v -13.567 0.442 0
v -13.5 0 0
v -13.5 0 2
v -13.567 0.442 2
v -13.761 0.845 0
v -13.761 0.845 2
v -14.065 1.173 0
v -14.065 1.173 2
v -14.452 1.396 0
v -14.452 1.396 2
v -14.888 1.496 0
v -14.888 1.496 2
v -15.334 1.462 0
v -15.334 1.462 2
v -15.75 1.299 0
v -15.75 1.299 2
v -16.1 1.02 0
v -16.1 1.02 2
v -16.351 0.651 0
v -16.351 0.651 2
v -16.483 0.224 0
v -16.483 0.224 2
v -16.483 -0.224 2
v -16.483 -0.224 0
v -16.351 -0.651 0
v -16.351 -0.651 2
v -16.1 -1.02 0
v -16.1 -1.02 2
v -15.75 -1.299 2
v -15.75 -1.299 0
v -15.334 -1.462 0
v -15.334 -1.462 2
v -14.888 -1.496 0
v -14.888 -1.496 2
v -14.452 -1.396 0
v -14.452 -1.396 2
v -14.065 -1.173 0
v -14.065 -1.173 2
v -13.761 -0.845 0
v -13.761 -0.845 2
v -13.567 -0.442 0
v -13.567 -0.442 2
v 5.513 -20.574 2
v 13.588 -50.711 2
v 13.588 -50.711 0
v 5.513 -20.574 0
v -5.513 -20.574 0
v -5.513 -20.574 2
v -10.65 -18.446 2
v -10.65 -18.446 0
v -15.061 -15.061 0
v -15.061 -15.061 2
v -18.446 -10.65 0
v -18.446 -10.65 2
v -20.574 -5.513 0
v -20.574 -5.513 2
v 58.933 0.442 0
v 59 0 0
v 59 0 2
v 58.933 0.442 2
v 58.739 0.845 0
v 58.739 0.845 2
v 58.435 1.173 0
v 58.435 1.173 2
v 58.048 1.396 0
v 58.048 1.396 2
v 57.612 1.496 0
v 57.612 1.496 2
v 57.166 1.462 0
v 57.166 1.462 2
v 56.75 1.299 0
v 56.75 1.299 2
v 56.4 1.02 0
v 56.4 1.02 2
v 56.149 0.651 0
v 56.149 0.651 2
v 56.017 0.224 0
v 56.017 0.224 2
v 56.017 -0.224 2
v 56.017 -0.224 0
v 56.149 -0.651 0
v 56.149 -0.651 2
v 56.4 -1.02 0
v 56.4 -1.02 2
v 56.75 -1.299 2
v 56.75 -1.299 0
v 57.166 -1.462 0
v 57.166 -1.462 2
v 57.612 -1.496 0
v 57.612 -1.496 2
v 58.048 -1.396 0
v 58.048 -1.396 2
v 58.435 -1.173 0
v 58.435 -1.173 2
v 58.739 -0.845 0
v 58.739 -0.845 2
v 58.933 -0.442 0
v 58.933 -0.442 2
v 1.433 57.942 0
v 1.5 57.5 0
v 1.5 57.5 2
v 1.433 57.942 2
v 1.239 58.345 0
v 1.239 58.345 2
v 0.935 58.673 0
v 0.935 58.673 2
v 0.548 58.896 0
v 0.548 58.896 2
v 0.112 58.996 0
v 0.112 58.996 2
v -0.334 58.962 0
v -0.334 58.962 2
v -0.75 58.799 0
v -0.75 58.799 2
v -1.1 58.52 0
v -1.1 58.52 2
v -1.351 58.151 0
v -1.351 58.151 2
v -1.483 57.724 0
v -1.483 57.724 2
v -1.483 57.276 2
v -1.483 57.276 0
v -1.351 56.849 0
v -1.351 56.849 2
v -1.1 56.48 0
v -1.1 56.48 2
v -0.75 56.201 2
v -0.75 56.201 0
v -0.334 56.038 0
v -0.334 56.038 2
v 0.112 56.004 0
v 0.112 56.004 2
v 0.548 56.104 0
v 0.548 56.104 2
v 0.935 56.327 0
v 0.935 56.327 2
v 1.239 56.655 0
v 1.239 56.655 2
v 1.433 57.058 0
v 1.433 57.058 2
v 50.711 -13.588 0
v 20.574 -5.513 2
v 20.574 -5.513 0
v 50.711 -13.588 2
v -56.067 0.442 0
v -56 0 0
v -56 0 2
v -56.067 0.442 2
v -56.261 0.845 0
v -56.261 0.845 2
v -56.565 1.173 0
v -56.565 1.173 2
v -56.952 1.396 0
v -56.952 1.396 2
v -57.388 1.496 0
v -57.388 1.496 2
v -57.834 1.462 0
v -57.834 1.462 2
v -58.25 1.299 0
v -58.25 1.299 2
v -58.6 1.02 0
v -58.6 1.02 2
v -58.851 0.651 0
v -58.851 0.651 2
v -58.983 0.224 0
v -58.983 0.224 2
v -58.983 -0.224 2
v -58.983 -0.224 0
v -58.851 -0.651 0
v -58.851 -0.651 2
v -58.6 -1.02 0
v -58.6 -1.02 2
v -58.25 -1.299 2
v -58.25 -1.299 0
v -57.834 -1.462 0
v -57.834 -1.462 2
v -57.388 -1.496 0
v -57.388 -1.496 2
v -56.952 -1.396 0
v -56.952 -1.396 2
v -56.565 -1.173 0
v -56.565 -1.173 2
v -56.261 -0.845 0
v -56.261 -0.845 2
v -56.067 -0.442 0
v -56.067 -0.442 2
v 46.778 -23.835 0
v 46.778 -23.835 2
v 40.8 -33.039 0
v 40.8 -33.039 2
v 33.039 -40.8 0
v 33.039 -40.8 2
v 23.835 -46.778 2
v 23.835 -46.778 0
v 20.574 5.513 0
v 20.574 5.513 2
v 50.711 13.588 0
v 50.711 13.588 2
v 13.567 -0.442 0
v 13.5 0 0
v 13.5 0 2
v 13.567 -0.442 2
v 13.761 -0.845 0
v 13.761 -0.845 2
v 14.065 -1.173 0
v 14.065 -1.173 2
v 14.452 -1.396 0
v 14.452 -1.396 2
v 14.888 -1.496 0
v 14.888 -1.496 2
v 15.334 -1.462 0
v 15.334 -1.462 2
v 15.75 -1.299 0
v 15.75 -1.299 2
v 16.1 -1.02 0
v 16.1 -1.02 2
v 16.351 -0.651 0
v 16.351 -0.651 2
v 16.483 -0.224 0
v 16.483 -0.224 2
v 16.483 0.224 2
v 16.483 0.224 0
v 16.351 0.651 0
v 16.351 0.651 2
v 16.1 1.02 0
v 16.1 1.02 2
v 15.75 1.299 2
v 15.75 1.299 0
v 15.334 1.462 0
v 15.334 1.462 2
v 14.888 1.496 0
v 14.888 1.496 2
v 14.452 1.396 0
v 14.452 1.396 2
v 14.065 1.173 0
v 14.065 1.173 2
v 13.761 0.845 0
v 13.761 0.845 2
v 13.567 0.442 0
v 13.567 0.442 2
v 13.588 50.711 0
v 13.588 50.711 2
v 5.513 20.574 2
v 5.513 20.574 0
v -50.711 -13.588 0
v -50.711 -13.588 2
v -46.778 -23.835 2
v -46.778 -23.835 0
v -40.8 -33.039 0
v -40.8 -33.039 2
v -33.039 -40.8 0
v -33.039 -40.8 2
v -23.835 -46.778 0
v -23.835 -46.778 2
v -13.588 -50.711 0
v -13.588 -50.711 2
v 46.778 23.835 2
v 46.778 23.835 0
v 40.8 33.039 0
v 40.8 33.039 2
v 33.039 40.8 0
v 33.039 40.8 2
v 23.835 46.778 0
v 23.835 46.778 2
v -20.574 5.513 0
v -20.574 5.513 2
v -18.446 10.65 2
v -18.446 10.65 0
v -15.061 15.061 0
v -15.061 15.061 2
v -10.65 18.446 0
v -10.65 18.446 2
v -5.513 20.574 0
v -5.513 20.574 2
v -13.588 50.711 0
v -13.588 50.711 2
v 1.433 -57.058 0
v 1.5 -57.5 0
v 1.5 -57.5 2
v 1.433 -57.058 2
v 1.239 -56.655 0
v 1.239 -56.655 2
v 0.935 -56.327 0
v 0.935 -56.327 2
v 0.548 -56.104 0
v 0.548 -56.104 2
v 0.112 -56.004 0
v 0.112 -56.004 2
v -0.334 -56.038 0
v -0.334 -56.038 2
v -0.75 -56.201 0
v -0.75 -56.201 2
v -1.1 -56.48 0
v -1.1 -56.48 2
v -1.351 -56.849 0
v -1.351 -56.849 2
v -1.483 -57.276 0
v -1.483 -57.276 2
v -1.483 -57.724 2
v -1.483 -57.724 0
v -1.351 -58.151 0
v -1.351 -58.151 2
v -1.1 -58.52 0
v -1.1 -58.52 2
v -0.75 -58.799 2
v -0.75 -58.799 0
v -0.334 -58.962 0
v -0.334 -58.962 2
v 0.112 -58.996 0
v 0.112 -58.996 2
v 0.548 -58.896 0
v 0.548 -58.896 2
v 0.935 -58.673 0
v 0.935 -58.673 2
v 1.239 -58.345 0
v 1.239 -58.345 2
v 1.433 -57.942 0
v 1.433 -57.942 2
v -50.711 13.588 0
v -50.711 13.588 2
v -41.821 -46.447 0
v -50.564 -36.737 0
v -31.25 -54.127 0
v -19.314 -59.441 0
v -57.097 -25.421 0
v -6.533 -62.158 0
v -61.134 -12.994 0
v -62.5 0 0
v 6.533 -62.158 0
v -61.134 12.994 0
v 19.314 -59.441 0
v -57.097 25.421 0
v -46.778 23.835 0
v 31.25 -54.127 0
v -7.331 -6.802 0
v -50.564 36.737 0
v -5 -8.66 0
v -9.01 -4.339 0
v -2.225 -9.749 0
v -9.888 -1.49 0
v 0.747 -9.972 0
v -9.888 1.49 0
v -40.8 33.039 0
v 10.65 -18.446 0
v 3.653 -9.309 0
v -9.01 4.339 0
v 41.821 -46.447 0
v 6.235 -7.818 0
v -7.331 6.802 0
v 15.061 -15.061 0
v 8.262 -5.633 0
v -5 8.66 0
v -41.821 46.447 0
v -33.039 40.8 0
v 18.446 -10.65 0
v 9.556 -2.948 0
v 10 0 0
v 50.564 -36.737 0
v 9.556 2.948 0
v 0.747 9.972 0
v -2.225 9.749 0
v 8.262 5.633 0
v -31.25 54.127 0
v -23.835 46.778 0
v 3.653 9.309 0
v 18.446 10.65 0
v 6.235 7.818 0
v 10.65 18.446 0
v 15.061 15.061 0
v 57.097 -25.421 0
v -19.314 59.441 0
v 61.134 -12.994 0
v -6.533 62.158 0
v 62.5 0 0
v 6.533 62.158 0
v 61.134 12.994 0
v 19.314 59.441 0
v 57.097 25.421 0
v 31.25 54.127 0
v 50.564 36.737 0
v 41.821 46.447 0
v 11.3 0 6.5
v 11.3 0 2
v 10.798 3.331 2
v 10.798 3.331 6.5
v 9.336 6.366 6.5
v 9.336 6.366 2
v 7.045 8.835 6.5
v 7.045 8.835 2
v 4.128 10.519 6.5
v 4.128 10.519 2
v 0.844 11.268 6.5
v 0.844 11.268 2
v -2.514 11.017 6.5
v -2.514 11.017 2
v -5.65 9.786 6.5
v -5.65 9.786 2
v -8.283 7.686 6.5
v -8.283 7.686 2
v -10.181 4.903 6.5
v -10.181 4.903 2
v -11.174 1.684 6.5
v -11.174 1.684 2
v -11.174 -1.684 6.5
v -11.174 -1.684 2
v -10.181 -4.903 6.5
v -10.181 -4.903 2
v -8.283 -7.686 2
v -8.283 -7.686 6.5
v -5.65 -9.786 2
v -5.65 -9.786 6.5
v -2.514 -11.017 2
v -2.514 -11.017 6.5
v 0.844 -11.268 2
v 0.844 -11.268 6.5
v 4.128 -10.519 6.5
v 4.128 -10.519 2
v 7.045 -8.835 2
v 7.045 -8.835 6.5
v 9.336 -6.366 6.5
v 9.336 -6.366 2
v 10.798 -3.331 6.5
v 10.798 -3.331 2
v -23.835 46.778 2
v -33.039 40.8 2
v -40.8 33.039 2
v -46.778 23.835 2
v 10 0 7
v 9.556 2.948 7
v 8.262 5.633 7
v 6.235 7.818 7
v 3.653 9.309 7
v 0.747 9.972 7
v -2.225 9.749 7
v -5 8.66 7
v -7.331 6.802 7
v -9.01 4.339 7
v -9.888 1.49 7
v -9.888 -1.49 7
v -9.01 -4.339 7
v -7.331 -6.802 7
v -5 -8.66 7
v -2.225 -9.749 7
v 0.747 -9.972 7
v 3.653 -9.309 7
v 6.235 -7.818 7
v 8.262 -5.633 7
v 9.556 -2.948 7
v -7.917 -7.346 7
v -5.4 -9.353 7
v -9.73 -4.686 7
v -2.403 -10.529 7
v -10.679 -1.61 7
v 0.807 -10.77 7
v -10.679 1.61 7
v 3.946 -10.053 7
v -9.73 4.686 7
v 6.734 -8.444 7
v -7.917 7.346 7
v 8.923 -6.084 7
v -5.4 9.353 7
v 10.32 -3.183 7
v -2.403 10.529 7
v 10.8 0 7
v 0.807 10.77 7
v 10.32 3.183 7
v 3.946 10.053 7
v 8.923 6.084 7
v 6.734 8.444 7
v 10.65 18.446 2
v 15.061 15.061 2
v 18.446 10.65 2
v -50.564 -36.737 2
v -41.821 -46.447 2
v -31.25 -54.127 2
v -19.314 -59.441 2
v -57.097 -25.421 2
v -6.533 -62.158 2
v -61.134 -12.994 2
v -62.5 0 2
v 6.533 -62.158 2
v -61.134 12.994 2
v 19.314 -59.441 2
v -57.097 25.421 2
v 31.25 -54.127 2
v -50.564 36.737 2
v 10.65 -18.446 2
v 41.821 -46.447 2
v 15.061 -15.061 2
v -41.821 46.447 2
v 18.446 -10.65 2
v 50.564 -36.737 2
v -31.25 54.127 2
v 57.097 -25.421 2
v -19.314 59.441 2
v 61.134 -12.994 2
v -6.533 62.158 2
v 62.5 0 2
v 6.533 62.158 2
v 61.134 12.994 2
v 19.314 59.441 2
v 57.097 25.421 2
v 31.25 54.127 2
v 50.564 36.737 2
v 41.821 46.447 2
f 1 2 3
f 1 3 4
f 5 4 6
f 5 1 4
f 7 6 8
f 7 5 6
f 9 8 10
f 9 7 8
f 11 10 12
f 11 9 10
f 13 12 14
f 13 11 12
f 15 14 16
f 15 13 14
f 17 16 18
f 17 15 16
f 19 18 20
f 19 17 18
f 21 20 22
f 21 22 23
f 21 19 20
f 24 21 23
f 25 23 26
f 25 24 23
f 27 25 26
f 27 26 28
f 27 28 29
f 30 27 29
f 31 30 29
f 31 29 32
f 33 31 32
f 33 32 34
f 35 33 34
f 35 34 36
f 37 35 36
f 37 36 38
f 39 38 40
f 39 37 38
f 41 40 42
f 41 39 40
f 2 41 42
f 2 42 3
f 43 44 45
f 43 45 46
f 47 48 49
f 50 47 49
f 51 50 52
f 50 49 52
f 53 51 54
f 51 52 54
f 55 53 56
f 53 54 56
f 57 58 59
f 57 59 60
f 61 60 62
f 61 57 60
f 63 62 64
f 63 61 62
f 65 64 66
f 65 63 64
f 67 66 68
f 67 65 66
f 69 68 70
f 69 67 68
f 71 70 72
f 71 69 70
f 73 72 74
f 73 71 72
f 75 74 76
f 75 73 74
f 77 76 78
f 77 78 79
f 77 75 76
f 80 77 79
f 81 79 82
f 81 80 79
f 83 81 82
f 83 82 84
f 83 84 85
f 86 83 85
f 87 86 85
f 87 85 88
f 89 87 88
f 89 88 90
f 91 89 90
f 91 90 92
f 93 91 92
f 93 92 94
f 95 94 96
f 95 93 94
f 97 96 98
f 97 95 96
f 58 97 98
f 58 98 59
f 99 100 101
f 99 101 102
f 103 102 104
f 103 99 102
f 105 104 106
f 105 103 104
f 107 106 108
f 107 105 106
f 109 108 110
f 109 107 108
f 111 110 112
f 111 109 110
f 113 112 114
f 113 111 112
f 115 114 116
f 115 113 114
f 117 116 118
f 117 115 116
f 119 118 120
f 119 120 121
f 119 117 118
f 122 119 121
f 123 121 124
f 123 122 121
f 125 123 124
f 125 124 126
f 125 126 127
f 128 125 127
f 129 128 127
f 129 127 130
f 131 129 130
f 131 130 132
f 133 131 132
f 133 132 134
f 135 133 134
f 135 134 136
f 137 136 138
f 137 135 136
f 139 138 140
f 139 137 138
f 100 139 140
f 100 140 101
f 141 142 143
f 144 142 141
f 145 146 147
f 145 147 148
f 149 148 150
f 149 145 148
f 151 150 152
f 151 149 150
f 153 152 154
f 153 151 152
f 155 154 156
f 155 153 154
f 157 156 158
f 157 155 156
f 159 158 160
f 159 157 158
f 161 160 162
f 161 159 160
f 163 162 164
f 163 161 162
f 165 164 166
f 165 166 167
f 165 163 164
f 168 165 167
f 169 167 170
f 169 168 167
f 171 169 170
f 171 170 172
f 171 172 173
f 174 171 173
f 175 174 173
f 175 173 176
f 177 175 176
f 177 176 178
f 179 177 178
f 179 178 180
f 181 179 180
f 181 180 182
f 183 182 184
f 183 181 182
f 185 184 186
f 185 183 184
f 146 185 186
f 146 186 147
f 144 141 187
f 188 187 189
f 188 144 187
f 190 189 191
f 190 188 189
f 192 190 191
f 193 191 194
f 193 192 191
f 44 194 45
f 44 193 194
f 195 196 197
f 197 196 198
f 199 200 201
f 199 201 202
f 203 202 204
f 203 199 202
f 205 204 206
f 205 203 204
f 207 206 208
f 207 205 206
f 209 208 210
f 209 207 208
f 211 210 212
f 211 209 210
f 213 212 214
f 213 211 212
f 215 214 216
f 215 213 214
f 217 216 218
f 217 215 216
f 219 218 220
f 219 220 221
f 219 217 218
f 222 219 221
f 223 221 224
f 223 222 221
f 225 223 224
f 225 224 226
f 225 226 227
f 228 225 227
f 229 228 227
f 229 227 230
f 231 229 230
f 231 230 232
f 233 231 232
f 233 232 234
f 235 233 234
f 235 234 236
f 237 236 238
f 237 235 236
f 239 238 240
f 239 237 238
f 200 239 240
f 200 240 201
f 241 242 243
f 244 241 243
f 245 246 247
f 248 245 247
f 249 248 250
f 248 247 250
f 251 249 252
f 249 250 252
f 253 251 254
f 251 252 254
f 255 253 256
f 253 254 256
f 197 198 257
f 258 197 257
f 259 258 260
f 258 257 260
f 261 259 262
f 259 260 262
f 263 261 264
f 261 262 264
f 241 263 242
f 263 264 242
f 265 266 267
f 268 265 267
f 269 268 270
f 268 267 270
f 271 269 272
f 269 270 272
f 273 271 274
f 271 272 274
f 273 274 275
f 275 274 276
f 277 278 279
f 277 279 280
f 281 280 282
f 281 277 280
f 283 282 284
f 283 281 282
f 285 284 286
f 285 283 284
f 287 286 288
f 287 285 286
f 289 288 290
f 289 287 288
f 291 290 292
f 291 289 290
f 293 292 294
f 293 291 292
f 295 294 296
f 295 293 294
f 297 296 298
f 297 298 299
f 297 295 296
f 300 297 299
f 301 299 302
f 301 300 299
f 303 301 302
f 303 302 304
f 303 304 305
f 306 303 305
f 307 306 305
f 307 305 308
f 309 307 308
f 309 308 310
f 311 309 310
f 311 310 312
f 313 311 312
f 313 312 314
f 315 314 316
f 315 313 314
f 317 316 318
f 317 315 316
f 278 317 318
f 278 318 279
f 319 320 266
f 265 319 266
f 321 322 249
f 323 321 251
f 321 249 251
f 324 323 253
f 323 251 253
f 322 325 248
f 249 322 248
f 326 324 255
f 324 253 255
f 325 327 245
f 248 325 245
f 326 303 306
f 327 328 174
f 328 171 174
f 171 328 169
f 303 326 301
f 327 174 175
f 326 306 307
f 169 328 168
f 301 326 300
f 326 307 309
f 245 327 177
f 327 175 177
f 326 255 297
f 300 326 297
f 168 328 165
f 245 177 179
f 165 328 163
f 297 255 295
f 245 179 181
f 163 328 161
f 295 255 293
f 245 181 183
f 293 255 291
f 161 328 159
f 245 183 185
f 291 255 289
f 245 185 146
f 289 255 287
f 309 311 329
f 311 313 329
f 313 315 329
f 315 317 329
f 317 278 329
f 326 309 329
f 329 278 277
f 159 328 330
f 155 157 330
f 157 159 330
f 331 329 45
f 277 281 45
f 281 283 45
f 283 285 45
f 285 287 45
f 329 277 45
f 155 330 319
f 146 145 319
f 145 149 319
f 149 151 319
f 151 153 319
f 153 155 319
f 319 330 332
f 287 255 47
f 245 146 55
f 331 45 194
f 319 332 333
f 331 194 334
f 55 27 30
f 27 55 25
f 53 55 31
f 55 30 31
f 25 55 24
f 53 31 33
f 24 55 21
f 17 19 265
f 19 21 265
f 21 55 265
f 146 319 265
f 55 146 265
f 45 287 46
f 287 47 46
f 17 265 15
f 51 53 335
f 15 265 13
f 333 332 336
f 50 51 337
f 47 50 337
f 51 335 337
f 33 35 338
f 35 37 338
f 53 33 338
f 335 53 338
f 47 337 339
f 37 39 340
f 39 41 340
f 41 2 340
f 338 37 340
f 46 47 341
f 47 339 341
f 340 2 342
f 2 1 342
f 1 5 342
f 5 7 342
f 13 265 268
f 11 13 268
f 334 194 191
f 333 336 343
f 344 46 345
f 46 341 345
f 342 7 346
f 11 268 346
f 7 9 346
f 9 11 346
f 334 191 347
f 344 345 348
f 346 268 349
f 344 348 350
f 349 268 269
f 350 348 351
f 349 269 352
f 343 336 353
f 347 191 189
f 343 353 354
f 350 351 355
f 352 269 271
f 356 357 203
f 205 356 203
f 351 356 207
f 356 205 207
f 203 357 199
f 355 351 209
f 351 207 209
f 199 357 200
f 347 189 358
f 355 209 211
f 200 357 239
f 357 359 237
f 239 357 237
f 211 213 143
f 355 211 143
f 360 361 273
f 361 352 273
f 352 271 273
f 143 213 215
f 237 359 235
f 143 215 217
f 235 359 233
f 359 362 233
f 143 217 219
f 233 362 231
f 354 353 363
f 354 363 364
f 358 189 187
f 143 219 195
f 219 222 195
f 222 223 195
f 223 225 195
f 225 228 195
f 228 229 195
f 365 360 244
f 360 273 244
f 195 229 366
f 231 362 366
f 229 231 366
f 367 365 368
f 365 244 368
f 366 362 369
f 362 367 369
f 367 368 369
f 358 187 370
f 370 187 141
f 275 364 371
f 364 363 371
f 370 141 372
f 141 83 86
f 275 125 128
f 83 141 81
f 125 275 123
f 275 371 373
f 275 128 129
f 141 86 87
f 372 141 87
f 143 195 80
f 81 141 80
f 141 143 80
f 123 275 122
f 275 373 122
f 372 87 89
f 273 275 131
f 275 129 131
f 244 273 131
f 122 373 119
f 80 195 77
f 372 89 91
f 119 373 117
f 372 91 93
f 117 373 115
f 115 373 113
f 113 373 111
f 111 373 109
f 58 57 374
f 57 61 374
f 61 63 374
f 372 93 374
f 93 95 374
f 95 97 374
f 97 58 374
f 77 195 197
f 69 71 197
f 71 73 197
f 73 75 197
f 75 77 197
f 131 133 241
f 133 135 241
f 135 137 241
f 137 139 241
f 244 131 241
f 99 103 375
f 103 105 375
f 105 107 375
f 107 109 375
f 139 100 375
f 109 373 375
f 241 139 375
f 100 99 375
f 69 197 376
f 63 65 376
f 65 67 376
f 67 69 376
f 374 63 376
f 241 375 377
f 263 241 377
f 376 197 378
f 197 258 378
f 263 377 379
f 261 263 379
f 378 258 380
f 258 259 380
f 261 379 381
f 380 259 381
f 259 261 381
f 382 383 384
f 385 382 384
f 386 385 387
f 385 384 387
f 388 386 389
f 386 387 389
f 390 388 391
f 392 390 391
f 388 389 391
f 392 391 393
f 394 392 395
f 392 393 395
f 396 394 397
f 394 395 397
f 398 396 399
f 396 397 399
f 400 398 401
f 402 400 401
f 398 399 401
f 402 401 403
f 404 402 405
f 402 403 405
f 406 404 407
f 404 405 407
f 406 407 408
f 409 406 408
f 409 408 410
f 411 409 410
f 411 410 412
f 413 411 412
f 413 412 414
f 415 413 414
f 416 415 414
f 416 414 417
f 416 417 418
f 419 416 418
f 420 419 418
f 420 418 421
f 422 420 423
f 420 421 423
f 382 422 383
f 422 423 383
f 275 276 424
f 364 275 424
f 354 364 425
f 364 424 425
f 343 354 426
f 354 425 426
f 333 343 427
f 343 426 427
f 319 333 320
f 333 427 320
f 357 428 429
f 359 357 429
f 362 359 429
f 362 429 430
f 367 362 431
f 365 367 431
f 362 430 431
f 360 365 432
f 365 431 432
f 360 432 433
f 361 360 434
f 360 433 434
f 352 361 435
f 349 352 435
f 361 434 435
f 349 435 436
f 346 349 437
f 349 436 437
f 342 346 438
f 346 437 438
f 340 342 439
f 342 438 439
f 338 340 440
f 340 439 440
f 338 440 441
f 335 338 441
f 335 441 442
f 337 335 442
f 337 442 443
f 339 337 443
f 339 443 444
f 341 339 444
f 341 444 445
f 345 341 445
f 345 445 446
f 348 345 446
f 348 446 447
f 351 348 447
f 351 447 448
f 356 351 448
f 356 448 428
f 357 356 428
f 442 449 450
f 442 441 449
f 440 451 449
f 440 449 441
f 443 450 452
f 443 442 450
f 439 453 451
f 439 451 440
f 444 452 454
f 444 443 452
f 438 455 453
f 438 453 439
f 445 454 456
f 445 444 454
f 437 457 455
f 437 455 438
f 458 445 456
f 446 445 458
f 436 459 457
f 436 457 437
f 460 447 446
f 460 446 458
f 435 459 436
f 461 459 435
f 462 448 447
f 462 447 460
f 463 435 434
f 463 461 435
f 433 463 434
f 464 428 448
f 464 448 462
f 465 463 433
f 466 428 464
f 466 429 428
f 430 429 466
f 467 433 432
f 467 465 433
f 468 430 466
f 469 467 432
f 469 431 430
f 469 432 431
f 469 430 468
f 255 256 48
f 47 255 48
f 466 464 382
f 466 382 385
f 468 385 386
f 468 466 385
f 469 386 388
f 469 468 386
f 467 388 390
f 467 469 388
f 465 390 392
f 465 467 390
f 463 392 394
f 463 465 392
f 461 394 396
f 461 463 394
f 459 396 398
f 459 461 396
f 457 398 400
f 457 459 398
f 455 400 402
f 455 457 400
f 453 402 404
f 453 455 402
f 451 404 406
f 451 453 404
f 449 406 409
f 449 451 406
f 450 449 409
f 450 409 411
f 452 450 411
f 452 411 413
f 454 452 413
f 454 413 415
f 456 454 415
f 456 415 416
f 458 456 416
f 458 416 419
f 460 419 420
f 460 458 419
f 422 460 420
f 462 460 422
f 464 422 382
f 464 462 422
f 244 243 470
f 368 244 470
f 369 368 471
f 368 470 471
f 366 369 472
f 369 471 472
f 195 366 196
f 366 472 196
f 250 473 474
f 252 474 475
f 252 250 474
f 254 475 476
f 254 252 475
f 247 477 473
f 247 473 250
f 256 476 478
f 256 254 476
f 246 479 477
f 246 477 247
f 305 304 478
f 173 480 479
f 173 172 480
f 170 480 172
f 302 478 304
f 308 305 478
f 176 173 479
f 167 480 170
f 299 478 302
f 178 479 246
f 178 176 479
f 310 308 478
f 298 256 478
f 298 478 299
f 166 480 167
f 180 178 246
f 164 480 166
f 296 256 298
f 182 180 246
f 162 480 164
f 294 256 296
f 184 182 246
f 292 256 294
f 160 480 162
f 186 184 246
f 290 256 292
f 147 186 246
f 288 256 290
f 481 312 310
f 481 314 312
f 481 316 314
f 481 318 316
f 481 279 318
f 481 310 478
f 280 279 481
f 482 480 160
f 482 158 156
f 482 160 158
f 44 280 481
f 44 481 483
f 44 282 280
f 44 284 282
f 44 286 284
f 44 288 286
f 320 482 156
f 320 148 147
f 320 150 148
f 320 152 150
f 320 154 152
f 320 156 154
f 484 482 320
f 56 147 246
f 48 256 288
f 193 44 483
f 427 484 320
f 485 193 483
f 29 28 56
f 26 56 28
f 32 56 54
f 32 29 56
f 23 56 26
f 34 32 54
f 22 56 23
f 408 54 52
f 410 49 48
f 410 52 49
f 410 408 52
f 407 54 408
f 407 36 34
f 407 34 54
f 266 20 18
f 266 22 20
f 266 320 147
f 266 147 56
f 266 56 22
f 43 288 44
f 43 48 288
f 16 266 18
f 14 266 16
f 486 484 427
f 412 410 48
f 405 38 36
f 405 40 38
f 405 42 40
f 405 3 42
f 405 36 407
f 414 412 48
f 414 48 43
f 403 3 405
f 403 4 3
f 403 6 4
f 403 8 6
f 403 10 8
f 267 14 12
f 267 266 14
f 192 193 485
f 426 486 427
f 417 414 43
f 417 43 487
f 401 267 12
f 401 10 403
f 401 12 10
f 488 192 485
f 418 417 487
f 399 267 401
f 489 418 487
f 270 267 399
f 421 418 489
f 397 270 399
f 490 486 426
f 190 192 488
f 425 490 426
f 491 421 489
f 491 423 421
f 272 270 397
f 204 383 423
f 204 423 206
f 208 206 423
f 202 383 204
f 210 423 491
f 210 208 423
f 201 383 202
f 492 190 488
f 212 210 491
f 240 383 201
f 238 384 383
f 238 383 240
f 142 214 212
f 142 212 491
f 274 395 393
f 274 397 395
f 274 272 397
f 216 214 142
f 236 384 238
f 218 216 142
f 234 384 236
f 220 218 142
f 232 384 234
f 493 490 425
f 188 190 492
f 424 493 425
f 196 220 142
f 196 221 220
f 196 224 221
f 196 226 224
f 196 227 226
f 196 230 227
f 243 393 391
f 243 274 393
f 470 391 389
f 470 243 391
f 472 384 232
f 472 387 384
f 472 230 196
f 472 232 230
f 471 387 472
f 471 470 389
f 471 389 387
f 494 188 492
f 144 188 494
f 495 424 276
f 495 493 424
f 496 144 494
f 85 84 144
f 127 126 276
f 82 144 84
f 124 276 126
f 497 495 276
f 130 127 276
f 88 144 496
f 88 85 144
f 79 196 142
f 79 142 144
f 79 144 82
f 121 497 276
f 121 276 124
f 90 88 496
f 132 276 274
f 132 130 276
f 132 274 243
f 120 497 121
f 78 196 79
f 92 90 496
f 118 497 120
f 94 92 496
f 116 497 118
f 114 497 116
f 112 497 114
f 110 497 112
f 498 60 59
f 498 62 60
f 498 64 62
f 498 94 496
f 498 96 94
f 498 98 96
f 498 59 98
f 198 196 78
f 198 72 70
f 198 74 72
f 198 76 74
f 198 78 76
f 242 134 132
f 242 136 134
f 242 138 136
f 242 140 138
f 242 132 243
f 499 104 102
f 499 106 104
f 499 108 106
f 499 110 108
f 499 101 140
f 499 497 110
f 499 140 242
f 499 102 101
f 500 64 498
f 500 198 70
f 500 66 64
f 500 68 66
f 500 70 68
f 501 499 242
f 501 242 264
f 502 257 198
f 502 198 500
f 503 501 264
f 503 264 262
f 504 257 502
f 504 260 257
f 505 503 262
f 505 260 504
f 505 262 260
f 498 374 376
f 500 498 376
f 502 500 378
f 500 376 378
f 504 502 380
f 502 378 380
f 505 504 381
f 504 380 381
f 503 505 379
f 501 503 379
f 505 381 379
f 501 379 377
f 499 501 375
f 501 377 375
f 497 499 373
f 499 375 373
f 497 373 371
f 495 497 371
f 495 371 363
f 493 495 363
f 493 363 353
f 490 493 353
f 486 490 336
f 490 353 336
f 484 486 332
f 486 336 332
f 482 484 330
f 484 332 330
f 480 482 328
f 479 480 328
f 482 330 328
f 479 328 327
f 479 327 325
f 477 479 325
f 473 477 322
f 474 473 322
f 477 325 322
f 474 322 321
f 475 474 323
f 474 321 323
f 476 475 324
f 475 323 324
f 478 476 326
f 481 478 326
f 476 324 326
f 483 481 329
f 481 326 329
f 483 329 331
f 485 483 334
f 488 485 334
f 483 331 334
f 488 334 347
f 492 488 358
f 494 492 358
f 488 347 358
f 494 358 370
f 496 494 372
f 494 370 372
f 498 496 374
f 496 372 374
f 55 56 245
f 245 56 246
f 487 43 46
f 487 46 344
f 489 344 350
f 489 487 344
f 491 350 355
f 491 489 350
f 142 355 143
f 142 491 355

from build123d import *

# Parameters (mm, degrees)
SKETCH1_R           = 62.5
SKETCH1_R_2         = 1.5
BOSS_EXTRUDE1_DEPTH = 2
SKETCH2_R           = 11.3
BOSS_EXTRUDE2_DEPTH = 5
SECTORS_DEPTH       = 89.529656048
SKETCH_1_R          = 10
CUT_EXTRUDE_1_DEPTH = 89.665100237
CHAMFER_1_SIZE      = 0.5


with BuildPart() as part:
    # Sketch1 → Boss-Extrude1 (new body)
    with BuildSketch(Plane.XY):
        Circle(SKETCH1_R)
        with Locations((-57.5, 0)):
            Circle(SKETCH1_R_2, mode=Mode.SUBTRACT)
        with Locations((0, 57.5)):
            Circle(SKETCH1_R_2, mode=Mode.SUBTRACT)
        with Locations((57.5, 0)):
            Circle(SKETCH1_R_2, mode=Mode.SUBTRACT)
        with Locations((0, -57.5)):
            Circle(SKETCH1_R_2, mode=Mode.SUBTRACT)
        with Locations((-15, 0)):
            Circle(SKETCH1_R_2, mode=Mode.SUBTRACT)
        with Locations(Location((15, 0, 0), (0, 0, 180))):
            Circle(SKETCH1_R_2, mode=Mode.SUBTRACT)
    extrude(amount=BOSS_EXTRUDE1_DEPTH)

    # Sketch2 → Boss-Extrude2 (add)
    with BuildSketch(Plane.XY.offset(2)):
        Circle(SKETCH2_R)
    extrude(amount=BOSS_EXTRUDE2_DEPTH)

    # Sector (Cut Extrude) → Sectors (cut, through all)
    with BuildSketch(Plane.XY.offset(2)):
        with BuildLine():
            Line((20.5742201, -5.512845661), (50.71110588, -13.587999868))
            ThreePointArc((50.71110588, -13.587999868), (37.123106012, -37.123106012), (13.587999868, -50.71110588))
            Line((13.587999868, -50.71110588), (5.512845661, -20.5742201))
            ThreePointArc((5.512845661, -20.5742201), (15.061374439, -15.061374439), (20.5742201, -5.512845661))
        make_face()
        with BuildLine():
            Line((-20.5742201, -5.512845661), (-50.71110588, -13.587999868))
            ThreePointArc((-50.71110588, -13.587999868), (-37.123106012, -37.123106012), (-13.587999868, -50.71110588))
            Line((-13.587999868, -50.71110588), (-5.512845661, -20.5742201))
            ThreePointArc((-5.512845661, -20.5742201), (-15.061374439, -15.061374439), (-20.5742201, -5.512845661))
        make_face()
        with BuildLine():
            Line((-5.512845661, 20.5742201), (-13.587999868, 50.71110588))
            ThreePointArc((-13.587999868, 50.71110588), (-37.123106012, 37.123106012), (-50.71110588, 13.587999868))
            Line((-50.71110588, 13.587999868), (-20.5742201, 5.512845661))
            ThreePointArc((-20.5742201, 5.512845661), (-15.061374439, 15.061374439), (-5.512845661, 20.5742201))
        make_face()
        with BuildLine():
            Line((20.5742201, 5.512845661), (50.71110588, 13.587999868))
            ThreePointArc((50.71110588, 13.587999868), (37.123106012, 37.123106012), (13.587999868, 50.71110588))
            Line((13.587999868, 50.71110588), (5.512845661, 20.5742201))
            ThreePointArc((5.512845661, 20.5742201), (15.061374439, 15.061374439), (20.5742201, 5.512845661))
        make_face()
    extrude(amount=-SECTORS_DEPTH, mode=Mode.SUBTRACT)

    # Эскиз1 → Вырез-Вытянуть1 (cut, through all)
    with BuildSketch(Plane.XY.offset(7)):
        Circle(SKETCH_1_R)
    extrude(amount=-CUT_EXTRUDE_1_DEPTH, mode=Mode.SUBTRACT)

    # Фаска1
    chamfer_1_edges = [part.edges().sort_by_distance(p)[0] for p in [
        (-11.3, 0, 7),
    ]]
    chamfer(chamfer_1_edges, length=CHAMFER_1_SIZE)


solid = part.part
